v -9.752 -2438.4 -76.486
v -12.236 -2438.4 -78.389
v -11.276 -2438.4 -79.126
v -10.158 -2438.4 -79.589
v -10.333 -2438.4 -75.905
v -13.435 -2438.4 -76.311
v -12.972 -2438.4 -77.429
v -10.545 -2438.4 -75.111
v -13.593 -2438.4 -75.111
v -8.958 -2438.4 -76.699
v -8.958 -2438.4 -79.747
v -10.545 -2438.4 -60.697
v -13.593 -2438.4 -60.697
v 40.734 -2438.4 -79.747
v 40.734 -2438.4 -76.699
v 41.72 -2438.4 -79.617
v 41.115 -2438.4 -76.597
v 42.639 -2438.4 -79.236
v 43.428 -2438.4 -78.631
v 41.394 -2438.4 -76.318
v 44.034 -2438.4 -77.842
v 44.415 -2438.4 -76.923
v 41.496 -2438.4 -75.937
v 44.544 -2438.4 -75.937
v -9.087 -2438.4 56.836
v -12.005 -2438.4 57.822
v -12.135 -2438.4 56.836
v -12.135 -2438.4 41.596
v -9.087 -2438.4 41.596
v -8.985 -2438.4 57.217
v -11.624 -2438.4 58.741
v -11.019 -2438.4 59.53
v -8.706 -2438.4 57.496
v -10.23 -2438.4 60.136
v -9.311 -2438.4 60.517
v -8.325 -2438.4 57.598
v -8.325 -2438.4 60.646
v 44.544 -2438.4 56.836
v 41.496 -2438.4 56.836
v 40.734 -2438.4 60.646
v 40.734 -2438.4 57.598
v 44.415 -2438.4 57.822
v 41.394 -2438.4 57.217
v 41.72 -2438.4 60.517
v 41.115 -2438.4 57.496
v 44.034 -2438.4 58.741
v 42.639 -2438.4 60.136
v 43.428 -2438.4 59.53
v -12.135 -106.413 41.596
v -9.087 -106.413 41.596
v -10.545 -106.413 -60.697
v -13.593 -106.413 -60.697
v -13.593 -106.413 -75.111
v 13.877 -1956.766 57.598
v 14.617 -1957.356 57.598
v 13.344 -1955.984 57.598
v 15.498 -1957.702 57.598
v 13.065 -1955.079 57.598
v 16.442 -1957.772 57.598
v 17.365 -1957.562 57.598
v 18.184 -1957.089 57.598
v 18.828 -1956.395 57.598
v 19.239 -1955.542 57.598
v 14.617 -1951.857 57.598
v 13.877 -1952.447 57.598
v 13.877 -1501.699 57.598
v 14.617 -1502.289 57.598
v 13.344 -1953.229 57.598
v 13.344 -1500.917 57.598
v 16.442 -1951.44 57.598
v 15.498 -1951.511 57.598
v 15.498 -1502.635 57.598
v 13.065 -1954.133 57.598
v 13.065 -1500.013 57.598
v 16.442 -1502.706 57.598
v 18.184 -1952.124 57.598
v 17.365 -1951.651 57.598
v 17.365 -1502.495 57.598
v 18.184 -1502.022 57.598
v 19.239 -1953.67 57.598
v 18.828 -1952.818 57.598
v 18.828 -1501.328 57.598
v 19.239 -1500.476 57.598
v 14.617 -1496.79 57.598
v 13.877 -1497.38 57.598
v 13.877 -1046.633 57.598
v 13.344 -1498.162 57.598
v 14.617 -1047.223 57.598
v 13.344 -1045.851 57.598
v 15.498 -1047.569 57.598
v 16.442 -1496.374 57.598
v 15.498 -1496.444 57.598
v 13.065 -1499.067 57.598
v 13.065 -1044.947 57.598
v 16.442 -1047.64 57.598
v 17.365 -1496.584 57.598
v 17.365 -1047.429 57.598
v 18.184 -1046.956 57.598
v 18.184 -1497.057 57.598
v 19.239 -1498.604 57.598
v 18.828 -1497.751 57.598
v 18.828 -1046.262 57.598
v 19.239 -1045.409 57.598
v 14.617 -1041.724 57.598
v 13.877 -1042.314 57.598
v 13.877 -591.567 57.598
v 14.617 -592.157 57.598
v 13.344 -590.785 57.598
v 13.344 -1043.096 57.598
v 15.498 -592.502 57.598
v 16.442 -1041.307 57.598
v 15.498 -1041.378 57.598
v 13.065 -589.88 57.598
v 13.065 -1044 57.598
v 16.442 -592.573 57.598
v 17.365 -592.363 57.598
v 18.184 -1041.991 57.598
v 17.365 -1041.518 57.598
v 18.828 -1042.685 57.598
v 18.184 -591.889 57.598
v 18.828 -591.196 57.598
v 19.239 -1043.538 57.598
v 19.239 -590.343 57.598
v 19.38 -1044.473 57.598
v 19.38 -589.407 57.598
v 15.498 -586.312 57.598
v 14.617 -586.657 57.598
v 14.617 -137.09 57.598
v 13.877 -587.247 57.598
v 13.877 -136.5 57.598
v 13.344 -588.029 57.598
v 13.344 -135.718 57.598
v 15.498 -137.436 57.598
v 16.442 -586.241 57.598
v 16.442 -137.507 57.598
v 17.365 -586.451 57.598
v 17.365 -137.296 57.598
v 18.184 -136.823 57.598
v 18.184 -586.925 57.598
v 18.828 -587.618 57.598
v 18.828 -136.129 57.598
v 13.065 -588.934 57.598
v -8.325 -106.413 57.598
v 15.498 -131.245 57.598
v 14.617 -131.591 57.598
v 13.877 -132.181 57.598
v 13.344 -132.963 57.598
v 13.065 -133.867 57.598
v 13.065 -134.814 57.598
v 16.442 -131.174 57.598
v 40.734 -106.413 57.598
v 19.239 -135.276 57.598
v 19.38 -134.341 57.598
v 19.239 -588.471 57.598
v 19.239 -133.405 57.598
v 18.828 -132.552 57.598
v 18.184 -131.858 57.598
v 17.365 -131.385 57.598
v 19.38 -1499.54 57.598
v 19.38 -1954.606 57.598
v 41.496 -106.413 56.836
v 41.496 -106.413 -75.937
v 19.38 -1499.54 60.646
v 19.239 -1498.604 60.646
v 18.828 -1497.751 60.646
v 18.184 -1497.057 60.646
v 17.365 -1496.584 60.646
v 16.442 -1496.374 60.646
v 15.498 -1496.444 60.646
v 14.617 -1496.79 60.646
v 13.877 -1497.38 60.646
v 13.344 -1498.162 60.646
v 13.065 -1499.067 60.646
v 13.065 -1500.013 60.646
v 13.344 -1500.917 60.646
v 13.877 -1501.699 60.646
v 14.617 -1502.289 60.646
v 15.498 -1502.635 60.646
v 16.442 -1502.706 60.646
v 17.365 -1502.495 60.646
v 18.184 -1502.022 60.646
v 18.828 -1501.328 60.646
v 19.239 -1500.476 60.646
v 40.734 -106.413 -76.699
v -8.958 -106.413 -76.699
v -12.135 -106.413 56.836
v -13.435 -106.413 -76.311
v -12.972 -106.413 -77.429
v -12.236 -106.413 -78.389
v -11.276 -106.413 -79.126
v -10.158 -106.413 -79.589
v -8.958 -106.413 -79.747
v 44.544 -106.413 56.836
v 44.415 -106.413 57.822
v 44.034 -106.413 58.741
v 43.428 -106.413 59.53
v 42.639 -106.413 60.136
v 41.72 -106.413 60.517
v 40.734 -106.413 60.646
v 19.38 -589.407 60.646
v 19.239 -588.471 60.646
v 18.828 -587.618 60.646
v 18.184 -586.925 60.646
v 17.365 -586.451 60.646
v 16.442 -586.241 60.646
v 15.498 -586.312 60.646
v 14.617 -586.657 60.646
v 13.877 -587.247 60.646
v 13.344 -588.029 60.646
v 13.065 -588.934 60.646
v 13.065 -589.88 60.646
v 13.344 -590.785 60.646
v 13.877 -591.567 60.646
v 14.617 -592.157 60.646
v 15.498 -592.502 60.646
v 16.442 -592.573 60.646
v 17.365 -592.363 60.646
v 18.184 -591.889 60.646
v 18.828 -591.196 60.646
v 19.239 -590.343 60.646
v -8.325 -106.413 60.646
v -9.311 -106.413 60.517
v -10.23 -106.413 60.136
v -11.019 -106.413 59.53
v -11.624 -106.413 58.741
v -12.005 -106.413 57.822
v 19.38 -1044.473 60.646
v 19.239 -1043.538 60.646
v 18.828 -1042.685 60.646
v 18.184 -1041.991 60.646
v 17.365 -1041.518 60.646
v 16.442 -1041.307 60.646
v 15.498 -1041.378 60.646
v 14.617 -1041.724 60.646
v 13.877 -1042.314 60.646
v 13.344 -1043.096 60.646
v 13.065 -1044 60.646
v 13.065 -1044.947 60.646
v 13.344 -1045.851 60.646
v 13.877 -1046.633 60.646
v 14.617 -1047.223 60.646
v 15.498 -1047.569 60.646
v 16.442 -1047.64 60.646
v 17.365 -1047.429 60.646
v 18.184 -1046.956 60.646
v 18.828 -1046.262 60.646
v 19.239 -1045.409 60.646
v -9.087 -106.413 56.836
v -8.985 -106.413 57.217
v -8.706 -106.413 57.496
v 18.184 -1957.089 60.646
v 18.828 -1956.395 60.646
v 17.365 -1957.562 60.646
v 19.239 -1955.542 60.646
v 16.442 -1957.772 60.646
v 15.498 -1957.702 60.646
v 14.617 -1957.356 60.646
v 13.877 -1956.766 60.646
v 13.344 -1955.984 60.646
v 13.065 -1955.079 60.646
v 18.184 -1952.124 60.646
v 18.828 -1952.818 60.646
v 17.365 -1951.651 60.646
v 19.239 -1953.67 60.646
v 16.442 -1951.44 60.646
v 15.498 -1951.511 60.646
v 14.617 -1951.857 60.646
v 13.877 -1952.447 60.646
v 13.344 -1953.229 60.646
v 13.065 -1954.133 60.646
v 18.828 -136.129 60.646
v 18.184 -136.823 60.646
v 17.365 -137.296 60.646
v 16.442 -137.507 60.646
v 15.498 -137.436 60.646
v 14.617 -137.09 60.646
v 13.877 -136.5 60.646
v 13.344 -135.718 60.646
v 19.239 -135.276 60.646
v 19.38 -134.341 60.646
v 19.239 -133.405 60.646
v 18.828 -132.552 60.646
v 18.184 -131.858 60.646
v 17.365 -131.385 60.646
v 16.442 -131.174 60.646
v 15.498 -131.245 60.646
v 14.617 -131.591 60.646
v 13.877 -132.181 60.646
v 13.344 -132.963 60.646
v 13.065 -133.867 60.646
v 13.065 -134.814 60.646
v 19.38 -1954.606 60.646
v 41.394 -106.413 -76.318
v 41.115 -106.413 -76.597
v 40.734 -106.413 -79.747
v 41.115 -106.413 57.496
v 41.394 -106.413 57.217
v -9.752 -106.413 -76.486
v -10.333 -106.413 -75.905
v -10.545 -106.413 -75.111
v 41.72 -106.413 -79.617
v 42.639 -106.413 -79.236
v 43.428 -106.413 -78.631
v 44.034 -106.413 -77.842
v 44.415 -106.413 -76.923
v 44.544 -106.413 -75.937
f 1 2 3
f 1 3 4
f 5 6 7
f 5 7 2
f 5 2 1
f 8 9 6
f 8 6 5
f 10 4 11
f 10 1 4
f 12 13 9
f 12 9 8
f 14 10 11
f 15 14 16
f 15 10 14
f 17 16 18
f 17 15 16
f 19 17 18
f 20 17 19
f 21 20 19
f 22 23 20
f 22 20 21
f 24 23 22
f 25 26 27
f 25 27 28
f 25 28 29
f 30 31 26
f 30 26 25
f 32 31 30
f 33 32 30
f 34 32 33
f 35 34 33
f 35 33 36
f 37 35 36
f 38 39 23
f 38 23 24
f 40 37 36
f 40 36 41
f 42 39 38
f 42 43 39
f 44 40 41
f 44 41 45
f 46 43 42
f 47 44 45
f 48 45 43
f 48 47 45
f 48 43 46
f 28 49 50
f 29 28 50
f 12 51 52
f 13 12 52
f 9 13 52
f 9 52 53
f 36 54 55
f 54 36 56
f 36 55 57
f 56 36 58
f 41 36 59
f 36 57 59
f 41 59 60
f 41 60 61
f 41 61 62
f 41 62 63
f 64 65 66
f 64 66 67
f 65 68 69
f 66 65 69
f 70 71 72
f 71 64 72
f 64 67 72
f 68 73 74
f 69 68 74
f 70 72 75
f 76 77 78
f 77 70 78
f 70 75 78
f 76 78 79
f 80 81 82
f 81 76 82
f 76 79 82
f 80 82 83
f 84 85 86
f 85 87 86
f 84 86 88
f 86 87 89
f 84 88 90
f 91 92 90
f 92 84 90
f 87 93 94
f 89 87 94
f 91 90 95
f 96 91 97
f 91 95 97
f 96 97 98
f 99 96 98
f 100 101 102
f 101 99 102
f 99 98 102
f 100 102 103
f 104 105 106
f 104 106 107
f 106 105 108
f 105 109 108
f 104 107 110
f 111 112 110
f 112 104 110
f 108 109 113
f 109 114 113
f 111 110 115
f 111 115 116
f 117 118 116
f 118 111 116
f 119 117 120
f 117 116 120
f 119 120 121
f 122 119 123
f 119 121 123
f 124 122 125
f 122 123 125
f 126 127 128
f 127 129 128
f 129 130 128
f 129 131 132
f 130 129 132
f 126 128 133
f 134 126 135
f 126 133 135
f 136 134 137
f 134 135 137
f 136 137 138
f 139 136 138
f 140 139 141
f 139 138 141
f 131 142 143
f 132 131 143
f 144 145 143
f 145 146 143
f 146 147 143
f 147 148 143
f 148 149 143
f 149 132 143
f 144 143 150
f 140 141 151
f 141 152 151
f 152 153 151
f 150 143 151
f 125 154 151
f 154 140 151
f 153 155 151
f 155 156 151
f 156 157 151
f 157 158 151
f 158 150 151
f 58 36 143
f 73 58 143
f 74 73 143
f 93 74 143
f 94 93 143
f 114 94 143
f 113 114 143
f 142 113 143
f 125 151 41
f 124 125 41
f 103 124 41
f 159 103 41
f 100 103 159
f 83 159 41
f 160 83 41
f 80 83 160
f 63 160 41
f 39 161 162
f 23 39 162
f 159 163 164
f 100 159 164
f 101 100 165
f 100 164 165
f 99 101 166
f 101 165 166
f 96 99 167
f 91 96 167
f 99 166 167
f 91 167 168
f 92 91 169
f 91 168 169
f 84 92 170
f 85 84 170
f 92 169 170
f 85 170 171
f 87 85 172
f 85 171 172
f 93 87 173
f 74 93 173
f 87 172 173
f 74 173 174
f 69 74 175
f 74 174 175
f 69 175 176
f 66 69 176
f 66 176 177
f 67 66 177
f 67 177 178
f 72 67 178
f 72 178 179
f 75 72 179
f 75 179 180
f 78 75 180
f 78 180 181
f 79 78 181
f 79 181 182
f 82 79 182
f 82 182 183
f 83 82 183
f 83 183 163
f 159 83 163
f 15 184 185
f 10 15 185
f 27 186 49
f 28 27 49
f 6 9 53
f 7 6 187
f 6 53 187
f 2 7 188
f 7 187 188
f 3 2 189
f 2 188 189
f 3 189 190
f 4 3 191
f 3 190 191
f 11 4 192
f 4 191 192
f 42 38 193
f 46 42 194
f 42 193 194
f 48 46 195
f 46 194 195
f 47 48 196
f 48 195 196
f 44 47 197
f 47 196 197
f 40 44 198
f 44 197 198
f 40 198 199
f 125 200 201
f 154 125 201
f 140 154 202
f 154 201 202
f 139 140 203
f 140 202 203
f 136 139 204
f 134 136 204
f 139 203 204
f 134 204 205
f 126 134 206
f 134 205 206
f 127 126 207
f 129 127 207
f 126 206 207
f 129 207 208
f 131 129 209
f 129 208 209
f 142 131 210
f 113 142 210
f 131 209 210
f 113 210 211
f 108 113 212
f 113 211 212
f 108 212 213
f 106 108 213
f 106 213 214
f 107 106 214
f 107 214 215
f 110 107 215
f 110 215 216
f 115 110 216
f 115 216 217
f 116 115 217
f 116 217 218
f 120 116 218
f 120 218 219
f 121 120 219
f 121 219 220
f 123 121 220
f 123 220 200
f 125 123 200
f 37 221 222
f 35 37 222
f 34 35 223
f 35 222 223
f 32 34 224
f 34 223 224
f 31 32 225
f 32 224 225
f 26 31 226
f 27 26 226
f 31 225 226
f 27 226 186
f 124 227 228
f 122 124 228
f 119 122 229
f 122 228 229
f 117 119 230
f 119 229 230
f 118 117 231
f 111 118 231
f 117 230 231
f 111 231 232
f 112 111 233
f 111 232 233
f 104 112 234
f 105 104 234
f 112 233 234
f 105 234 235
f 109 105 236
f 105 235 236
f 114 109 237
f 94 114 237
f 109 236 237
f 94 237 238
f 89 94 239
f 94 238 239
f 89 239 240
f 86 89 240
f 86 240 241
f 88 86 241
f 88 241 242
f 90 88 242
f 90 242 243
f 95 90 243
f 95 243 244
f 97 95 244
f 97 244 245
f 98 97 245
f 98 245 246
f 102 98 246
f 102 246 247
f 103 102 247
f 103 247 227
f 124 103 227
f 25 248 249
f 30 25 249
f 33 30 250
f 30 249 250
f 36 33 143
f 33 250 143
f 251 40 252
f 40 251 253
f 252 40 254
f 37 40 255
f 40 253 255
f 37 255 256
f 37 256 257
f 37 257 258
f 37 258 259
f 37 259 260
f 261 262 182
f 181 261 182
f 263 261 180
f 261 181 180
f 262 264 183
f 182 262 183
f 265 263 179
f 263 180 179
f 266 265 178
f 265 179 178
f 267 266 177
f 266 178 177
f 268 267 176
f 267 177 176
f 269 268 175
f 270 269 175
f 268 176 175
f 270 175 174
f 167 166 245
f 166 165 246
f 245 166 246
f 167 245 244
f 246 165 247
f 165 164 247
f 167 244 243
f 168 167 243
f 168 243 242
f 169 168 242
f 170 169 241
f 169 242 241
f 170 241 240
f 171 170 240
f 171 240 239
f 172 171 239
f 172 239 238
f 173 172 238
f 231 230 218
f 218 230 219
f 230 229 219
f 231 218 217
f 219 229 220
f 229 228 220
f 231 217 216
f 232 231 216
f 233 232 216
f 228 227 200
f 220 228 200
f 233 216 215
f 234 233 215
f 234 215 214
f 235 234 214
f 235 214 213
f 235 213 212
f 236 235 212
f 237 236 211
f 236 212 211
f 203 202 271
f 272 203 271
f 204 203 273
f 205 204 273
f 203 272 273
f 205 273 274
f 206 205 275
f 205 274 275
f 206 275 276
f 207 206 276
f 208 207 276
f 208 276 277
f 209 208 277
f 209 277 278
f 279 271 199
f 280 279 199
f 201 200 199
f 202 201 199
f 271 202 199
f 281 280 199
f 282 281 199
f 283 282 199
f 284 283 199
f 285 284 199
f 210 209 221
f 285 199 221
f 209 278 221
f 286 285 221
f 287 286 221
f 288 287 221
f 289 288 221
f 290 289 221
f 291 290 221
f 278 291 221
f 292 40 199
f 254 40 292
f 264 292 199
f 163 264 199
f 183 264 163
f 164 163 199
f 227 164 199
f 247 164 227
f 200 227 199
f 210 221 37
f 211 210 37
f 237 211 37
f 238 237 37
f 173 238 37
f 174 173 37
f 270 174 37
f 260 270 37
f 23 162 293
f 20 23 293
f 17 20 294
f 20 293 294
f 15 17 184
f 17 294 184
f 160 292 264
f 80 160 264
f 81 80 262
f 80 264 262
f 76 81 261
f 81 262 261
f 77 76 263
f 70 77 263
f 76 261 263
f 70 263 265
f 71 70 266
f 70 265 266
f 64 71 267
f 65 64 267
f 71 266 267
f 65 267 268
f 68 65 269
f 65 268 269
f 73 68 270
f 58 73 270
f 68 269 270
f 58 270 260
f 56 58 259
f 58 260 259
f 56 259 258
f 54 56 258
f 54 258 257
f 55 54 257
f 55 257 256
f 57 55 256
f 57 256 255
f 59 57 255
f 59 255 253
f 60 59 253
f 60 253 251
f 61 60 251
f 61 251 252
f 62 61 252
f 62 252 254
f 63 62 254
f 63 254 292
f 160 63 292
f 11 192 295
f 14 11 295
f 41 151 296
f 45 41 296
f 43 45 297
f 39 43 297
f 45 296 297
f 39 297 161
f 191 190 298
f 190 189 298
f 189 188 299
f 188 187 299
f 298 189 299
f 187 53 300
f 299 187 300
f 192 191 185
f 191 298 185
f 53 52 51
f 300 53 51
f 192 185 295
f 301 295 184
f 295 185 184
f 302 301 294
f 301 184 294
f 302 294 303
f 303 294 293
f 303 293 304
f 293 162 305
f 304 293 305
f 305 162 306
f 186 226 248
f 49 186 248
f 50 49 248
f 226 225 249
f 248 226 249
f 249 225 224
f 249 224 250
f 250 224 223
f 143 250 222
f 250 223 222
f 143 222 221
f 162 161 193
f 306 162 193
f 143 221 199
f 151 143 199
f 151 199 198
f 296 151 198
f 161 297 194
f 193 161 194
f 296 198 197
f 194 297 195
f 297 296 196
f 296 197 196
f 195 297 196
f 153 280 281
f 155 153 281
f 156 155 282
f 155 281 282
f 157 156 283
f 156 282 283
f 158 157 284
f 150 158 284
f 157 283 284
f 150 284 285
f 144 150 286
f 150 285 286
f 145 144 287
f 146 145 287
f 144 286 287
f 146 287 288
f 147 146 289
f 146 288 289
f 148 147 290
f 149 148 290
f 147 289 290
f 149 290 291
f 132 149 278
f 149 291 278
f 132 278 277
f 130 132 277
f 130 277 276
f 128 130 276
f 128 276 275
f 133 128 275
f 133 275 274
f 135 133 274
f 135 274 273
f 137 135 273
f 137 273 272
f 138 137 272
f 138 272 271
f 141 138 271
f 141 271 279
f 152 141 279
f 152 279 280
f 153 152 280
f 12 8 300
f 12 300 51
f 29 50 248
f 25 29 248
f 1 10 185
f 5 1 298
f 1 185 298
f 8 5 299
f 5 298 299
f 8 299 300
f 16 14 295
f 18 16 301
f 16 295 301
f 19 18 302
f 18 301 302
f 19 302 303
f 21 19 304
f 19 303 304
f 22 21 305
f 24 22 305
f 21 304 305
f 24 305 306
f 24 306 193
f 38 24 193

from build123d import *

# Parameters (mm, degrees)
F1_DEPTH = 2438.4
F2_W     = 49.059084
F2_H     = 106.4133
F3_DEPTH = 140.3941152
F4_R     = 3.175
F5_DEPTH = 3.302


with BuildPart() as f1:
    # F0 (on Front) → F1 (new body)
    with BuildSketch(Plane.XZ):
        with BuildLine():
            Line((-10.5452926, -75.1112544), (-10.5452926, -60.6967544))
            Line((-10.5452926, -60.6967544), (-13.5932926, -60.6967544))
            Line((-13.5932926, -60.6967544), (-13.5932926, -75.1112544))
            ThreePointArc((-13.5932926, -75.1112544), (-12.2355860842, -78.3890478842), (-8.9577926, -79.7467544))
            Line((-8.9577926, -79.7467544), (40.7343864, -79.7467544))
            ThreePointArc((40.7343864, -79.7467544), (43.4284632363, -78.6308312363), (44.5443864, -75.9367544))
            Line((44.5443864, -75.9367544), (44.5443864, 56.8363608))
            ThreePointArc((44.5443864, 56.8363608), (43.4284632363, 59.5304376363), (40.7343864, 60.6463608))
            Line((40.7343864, 60.6463608), (-8.3246976, 60.6463608))
            ThreePointArc((-8.3246976, 60.6463608), (-11.0187744363, 59.5304376363), (-12.1346976, 56.8363608))
            Line((-12.1346976, 56.8363608), (-12.1346976, 41.5963608))
            Line((-12.1346976, 41.5963608), (-9.0866976, 41.5963608))
            Line((-9.0866976, 41.5963608), (-9.0866976, 56.8363608))
            ThreePointArc((-9.0866976, 56.8363608), (-8.8635129673, 57.3751761673), (-8.3246976, 57.5983608))
            Line((-8.3246976, 57.5983608), (40.7343864, 57.5983608))
            ThreePointArc((40.7343864, 57.5983608), (41.2732017673, 57.3751761673), (41.4963864, 56.8363608))
            Line((41.4963864, 56.8363608), (41.4963864, -75.9367544))
            ThreePointArc((41.4963864, -75.9367544), (41.2732017673, -76.4755697673), (40.7343864, -76.6987544))
            Line((40.7343864, -76.6987544), (-8.9577926, -76.6987544))
            ThreePointArc((-8.9577926, -76.6987544), (-10.0803246151, -76.2337864151), (-10.5452926, -75.1112544))
        make_face()
    extrude(amount=F1_DEPTH)

    # F2 (on face) → F3 (cut, through all)
    with BuildSketch(Plane.XY.offset(60.6463608)):
        Polygon((-56.2798976, -106.4133), (-8.3246976, -106.4133), (-8.3246976, 0), (40.7343864, 0), (40.7343864, -106.4133), (92.9059864, -106.4133), (92.9059864, 23.1394), (-56.2798976, 23.1394), align=None)
        with Locations((16.2048444, -53.20665)):
            Rectangle(F2_W, F2_H)
    extrude(amount=-F3_DEPTH, mode=Mode.SUBTRACT)

    # F4 (on face) → F5 (cut)
    with BuildSketch(Plane.XY.offset(60.6463608)):
        with Locations((16.2048444, -134.3406)):
            Circle(F4_R)
        with Locations((16.2048444, -589.407)):
            Circle(F4_R)
        with Locations((16.2048444, -1044.4734)):
            Circle(F4_R)
        with Locations((16.2048444, -1499.5398)):
            Circle(F4_R)
        with Locations((16.2048444, -1954.6062)):
            Circle(F4_R)
    extrude(amount=-F5_DEPTH, mode=Mode.SUBTRACT)


solid = f1.part
